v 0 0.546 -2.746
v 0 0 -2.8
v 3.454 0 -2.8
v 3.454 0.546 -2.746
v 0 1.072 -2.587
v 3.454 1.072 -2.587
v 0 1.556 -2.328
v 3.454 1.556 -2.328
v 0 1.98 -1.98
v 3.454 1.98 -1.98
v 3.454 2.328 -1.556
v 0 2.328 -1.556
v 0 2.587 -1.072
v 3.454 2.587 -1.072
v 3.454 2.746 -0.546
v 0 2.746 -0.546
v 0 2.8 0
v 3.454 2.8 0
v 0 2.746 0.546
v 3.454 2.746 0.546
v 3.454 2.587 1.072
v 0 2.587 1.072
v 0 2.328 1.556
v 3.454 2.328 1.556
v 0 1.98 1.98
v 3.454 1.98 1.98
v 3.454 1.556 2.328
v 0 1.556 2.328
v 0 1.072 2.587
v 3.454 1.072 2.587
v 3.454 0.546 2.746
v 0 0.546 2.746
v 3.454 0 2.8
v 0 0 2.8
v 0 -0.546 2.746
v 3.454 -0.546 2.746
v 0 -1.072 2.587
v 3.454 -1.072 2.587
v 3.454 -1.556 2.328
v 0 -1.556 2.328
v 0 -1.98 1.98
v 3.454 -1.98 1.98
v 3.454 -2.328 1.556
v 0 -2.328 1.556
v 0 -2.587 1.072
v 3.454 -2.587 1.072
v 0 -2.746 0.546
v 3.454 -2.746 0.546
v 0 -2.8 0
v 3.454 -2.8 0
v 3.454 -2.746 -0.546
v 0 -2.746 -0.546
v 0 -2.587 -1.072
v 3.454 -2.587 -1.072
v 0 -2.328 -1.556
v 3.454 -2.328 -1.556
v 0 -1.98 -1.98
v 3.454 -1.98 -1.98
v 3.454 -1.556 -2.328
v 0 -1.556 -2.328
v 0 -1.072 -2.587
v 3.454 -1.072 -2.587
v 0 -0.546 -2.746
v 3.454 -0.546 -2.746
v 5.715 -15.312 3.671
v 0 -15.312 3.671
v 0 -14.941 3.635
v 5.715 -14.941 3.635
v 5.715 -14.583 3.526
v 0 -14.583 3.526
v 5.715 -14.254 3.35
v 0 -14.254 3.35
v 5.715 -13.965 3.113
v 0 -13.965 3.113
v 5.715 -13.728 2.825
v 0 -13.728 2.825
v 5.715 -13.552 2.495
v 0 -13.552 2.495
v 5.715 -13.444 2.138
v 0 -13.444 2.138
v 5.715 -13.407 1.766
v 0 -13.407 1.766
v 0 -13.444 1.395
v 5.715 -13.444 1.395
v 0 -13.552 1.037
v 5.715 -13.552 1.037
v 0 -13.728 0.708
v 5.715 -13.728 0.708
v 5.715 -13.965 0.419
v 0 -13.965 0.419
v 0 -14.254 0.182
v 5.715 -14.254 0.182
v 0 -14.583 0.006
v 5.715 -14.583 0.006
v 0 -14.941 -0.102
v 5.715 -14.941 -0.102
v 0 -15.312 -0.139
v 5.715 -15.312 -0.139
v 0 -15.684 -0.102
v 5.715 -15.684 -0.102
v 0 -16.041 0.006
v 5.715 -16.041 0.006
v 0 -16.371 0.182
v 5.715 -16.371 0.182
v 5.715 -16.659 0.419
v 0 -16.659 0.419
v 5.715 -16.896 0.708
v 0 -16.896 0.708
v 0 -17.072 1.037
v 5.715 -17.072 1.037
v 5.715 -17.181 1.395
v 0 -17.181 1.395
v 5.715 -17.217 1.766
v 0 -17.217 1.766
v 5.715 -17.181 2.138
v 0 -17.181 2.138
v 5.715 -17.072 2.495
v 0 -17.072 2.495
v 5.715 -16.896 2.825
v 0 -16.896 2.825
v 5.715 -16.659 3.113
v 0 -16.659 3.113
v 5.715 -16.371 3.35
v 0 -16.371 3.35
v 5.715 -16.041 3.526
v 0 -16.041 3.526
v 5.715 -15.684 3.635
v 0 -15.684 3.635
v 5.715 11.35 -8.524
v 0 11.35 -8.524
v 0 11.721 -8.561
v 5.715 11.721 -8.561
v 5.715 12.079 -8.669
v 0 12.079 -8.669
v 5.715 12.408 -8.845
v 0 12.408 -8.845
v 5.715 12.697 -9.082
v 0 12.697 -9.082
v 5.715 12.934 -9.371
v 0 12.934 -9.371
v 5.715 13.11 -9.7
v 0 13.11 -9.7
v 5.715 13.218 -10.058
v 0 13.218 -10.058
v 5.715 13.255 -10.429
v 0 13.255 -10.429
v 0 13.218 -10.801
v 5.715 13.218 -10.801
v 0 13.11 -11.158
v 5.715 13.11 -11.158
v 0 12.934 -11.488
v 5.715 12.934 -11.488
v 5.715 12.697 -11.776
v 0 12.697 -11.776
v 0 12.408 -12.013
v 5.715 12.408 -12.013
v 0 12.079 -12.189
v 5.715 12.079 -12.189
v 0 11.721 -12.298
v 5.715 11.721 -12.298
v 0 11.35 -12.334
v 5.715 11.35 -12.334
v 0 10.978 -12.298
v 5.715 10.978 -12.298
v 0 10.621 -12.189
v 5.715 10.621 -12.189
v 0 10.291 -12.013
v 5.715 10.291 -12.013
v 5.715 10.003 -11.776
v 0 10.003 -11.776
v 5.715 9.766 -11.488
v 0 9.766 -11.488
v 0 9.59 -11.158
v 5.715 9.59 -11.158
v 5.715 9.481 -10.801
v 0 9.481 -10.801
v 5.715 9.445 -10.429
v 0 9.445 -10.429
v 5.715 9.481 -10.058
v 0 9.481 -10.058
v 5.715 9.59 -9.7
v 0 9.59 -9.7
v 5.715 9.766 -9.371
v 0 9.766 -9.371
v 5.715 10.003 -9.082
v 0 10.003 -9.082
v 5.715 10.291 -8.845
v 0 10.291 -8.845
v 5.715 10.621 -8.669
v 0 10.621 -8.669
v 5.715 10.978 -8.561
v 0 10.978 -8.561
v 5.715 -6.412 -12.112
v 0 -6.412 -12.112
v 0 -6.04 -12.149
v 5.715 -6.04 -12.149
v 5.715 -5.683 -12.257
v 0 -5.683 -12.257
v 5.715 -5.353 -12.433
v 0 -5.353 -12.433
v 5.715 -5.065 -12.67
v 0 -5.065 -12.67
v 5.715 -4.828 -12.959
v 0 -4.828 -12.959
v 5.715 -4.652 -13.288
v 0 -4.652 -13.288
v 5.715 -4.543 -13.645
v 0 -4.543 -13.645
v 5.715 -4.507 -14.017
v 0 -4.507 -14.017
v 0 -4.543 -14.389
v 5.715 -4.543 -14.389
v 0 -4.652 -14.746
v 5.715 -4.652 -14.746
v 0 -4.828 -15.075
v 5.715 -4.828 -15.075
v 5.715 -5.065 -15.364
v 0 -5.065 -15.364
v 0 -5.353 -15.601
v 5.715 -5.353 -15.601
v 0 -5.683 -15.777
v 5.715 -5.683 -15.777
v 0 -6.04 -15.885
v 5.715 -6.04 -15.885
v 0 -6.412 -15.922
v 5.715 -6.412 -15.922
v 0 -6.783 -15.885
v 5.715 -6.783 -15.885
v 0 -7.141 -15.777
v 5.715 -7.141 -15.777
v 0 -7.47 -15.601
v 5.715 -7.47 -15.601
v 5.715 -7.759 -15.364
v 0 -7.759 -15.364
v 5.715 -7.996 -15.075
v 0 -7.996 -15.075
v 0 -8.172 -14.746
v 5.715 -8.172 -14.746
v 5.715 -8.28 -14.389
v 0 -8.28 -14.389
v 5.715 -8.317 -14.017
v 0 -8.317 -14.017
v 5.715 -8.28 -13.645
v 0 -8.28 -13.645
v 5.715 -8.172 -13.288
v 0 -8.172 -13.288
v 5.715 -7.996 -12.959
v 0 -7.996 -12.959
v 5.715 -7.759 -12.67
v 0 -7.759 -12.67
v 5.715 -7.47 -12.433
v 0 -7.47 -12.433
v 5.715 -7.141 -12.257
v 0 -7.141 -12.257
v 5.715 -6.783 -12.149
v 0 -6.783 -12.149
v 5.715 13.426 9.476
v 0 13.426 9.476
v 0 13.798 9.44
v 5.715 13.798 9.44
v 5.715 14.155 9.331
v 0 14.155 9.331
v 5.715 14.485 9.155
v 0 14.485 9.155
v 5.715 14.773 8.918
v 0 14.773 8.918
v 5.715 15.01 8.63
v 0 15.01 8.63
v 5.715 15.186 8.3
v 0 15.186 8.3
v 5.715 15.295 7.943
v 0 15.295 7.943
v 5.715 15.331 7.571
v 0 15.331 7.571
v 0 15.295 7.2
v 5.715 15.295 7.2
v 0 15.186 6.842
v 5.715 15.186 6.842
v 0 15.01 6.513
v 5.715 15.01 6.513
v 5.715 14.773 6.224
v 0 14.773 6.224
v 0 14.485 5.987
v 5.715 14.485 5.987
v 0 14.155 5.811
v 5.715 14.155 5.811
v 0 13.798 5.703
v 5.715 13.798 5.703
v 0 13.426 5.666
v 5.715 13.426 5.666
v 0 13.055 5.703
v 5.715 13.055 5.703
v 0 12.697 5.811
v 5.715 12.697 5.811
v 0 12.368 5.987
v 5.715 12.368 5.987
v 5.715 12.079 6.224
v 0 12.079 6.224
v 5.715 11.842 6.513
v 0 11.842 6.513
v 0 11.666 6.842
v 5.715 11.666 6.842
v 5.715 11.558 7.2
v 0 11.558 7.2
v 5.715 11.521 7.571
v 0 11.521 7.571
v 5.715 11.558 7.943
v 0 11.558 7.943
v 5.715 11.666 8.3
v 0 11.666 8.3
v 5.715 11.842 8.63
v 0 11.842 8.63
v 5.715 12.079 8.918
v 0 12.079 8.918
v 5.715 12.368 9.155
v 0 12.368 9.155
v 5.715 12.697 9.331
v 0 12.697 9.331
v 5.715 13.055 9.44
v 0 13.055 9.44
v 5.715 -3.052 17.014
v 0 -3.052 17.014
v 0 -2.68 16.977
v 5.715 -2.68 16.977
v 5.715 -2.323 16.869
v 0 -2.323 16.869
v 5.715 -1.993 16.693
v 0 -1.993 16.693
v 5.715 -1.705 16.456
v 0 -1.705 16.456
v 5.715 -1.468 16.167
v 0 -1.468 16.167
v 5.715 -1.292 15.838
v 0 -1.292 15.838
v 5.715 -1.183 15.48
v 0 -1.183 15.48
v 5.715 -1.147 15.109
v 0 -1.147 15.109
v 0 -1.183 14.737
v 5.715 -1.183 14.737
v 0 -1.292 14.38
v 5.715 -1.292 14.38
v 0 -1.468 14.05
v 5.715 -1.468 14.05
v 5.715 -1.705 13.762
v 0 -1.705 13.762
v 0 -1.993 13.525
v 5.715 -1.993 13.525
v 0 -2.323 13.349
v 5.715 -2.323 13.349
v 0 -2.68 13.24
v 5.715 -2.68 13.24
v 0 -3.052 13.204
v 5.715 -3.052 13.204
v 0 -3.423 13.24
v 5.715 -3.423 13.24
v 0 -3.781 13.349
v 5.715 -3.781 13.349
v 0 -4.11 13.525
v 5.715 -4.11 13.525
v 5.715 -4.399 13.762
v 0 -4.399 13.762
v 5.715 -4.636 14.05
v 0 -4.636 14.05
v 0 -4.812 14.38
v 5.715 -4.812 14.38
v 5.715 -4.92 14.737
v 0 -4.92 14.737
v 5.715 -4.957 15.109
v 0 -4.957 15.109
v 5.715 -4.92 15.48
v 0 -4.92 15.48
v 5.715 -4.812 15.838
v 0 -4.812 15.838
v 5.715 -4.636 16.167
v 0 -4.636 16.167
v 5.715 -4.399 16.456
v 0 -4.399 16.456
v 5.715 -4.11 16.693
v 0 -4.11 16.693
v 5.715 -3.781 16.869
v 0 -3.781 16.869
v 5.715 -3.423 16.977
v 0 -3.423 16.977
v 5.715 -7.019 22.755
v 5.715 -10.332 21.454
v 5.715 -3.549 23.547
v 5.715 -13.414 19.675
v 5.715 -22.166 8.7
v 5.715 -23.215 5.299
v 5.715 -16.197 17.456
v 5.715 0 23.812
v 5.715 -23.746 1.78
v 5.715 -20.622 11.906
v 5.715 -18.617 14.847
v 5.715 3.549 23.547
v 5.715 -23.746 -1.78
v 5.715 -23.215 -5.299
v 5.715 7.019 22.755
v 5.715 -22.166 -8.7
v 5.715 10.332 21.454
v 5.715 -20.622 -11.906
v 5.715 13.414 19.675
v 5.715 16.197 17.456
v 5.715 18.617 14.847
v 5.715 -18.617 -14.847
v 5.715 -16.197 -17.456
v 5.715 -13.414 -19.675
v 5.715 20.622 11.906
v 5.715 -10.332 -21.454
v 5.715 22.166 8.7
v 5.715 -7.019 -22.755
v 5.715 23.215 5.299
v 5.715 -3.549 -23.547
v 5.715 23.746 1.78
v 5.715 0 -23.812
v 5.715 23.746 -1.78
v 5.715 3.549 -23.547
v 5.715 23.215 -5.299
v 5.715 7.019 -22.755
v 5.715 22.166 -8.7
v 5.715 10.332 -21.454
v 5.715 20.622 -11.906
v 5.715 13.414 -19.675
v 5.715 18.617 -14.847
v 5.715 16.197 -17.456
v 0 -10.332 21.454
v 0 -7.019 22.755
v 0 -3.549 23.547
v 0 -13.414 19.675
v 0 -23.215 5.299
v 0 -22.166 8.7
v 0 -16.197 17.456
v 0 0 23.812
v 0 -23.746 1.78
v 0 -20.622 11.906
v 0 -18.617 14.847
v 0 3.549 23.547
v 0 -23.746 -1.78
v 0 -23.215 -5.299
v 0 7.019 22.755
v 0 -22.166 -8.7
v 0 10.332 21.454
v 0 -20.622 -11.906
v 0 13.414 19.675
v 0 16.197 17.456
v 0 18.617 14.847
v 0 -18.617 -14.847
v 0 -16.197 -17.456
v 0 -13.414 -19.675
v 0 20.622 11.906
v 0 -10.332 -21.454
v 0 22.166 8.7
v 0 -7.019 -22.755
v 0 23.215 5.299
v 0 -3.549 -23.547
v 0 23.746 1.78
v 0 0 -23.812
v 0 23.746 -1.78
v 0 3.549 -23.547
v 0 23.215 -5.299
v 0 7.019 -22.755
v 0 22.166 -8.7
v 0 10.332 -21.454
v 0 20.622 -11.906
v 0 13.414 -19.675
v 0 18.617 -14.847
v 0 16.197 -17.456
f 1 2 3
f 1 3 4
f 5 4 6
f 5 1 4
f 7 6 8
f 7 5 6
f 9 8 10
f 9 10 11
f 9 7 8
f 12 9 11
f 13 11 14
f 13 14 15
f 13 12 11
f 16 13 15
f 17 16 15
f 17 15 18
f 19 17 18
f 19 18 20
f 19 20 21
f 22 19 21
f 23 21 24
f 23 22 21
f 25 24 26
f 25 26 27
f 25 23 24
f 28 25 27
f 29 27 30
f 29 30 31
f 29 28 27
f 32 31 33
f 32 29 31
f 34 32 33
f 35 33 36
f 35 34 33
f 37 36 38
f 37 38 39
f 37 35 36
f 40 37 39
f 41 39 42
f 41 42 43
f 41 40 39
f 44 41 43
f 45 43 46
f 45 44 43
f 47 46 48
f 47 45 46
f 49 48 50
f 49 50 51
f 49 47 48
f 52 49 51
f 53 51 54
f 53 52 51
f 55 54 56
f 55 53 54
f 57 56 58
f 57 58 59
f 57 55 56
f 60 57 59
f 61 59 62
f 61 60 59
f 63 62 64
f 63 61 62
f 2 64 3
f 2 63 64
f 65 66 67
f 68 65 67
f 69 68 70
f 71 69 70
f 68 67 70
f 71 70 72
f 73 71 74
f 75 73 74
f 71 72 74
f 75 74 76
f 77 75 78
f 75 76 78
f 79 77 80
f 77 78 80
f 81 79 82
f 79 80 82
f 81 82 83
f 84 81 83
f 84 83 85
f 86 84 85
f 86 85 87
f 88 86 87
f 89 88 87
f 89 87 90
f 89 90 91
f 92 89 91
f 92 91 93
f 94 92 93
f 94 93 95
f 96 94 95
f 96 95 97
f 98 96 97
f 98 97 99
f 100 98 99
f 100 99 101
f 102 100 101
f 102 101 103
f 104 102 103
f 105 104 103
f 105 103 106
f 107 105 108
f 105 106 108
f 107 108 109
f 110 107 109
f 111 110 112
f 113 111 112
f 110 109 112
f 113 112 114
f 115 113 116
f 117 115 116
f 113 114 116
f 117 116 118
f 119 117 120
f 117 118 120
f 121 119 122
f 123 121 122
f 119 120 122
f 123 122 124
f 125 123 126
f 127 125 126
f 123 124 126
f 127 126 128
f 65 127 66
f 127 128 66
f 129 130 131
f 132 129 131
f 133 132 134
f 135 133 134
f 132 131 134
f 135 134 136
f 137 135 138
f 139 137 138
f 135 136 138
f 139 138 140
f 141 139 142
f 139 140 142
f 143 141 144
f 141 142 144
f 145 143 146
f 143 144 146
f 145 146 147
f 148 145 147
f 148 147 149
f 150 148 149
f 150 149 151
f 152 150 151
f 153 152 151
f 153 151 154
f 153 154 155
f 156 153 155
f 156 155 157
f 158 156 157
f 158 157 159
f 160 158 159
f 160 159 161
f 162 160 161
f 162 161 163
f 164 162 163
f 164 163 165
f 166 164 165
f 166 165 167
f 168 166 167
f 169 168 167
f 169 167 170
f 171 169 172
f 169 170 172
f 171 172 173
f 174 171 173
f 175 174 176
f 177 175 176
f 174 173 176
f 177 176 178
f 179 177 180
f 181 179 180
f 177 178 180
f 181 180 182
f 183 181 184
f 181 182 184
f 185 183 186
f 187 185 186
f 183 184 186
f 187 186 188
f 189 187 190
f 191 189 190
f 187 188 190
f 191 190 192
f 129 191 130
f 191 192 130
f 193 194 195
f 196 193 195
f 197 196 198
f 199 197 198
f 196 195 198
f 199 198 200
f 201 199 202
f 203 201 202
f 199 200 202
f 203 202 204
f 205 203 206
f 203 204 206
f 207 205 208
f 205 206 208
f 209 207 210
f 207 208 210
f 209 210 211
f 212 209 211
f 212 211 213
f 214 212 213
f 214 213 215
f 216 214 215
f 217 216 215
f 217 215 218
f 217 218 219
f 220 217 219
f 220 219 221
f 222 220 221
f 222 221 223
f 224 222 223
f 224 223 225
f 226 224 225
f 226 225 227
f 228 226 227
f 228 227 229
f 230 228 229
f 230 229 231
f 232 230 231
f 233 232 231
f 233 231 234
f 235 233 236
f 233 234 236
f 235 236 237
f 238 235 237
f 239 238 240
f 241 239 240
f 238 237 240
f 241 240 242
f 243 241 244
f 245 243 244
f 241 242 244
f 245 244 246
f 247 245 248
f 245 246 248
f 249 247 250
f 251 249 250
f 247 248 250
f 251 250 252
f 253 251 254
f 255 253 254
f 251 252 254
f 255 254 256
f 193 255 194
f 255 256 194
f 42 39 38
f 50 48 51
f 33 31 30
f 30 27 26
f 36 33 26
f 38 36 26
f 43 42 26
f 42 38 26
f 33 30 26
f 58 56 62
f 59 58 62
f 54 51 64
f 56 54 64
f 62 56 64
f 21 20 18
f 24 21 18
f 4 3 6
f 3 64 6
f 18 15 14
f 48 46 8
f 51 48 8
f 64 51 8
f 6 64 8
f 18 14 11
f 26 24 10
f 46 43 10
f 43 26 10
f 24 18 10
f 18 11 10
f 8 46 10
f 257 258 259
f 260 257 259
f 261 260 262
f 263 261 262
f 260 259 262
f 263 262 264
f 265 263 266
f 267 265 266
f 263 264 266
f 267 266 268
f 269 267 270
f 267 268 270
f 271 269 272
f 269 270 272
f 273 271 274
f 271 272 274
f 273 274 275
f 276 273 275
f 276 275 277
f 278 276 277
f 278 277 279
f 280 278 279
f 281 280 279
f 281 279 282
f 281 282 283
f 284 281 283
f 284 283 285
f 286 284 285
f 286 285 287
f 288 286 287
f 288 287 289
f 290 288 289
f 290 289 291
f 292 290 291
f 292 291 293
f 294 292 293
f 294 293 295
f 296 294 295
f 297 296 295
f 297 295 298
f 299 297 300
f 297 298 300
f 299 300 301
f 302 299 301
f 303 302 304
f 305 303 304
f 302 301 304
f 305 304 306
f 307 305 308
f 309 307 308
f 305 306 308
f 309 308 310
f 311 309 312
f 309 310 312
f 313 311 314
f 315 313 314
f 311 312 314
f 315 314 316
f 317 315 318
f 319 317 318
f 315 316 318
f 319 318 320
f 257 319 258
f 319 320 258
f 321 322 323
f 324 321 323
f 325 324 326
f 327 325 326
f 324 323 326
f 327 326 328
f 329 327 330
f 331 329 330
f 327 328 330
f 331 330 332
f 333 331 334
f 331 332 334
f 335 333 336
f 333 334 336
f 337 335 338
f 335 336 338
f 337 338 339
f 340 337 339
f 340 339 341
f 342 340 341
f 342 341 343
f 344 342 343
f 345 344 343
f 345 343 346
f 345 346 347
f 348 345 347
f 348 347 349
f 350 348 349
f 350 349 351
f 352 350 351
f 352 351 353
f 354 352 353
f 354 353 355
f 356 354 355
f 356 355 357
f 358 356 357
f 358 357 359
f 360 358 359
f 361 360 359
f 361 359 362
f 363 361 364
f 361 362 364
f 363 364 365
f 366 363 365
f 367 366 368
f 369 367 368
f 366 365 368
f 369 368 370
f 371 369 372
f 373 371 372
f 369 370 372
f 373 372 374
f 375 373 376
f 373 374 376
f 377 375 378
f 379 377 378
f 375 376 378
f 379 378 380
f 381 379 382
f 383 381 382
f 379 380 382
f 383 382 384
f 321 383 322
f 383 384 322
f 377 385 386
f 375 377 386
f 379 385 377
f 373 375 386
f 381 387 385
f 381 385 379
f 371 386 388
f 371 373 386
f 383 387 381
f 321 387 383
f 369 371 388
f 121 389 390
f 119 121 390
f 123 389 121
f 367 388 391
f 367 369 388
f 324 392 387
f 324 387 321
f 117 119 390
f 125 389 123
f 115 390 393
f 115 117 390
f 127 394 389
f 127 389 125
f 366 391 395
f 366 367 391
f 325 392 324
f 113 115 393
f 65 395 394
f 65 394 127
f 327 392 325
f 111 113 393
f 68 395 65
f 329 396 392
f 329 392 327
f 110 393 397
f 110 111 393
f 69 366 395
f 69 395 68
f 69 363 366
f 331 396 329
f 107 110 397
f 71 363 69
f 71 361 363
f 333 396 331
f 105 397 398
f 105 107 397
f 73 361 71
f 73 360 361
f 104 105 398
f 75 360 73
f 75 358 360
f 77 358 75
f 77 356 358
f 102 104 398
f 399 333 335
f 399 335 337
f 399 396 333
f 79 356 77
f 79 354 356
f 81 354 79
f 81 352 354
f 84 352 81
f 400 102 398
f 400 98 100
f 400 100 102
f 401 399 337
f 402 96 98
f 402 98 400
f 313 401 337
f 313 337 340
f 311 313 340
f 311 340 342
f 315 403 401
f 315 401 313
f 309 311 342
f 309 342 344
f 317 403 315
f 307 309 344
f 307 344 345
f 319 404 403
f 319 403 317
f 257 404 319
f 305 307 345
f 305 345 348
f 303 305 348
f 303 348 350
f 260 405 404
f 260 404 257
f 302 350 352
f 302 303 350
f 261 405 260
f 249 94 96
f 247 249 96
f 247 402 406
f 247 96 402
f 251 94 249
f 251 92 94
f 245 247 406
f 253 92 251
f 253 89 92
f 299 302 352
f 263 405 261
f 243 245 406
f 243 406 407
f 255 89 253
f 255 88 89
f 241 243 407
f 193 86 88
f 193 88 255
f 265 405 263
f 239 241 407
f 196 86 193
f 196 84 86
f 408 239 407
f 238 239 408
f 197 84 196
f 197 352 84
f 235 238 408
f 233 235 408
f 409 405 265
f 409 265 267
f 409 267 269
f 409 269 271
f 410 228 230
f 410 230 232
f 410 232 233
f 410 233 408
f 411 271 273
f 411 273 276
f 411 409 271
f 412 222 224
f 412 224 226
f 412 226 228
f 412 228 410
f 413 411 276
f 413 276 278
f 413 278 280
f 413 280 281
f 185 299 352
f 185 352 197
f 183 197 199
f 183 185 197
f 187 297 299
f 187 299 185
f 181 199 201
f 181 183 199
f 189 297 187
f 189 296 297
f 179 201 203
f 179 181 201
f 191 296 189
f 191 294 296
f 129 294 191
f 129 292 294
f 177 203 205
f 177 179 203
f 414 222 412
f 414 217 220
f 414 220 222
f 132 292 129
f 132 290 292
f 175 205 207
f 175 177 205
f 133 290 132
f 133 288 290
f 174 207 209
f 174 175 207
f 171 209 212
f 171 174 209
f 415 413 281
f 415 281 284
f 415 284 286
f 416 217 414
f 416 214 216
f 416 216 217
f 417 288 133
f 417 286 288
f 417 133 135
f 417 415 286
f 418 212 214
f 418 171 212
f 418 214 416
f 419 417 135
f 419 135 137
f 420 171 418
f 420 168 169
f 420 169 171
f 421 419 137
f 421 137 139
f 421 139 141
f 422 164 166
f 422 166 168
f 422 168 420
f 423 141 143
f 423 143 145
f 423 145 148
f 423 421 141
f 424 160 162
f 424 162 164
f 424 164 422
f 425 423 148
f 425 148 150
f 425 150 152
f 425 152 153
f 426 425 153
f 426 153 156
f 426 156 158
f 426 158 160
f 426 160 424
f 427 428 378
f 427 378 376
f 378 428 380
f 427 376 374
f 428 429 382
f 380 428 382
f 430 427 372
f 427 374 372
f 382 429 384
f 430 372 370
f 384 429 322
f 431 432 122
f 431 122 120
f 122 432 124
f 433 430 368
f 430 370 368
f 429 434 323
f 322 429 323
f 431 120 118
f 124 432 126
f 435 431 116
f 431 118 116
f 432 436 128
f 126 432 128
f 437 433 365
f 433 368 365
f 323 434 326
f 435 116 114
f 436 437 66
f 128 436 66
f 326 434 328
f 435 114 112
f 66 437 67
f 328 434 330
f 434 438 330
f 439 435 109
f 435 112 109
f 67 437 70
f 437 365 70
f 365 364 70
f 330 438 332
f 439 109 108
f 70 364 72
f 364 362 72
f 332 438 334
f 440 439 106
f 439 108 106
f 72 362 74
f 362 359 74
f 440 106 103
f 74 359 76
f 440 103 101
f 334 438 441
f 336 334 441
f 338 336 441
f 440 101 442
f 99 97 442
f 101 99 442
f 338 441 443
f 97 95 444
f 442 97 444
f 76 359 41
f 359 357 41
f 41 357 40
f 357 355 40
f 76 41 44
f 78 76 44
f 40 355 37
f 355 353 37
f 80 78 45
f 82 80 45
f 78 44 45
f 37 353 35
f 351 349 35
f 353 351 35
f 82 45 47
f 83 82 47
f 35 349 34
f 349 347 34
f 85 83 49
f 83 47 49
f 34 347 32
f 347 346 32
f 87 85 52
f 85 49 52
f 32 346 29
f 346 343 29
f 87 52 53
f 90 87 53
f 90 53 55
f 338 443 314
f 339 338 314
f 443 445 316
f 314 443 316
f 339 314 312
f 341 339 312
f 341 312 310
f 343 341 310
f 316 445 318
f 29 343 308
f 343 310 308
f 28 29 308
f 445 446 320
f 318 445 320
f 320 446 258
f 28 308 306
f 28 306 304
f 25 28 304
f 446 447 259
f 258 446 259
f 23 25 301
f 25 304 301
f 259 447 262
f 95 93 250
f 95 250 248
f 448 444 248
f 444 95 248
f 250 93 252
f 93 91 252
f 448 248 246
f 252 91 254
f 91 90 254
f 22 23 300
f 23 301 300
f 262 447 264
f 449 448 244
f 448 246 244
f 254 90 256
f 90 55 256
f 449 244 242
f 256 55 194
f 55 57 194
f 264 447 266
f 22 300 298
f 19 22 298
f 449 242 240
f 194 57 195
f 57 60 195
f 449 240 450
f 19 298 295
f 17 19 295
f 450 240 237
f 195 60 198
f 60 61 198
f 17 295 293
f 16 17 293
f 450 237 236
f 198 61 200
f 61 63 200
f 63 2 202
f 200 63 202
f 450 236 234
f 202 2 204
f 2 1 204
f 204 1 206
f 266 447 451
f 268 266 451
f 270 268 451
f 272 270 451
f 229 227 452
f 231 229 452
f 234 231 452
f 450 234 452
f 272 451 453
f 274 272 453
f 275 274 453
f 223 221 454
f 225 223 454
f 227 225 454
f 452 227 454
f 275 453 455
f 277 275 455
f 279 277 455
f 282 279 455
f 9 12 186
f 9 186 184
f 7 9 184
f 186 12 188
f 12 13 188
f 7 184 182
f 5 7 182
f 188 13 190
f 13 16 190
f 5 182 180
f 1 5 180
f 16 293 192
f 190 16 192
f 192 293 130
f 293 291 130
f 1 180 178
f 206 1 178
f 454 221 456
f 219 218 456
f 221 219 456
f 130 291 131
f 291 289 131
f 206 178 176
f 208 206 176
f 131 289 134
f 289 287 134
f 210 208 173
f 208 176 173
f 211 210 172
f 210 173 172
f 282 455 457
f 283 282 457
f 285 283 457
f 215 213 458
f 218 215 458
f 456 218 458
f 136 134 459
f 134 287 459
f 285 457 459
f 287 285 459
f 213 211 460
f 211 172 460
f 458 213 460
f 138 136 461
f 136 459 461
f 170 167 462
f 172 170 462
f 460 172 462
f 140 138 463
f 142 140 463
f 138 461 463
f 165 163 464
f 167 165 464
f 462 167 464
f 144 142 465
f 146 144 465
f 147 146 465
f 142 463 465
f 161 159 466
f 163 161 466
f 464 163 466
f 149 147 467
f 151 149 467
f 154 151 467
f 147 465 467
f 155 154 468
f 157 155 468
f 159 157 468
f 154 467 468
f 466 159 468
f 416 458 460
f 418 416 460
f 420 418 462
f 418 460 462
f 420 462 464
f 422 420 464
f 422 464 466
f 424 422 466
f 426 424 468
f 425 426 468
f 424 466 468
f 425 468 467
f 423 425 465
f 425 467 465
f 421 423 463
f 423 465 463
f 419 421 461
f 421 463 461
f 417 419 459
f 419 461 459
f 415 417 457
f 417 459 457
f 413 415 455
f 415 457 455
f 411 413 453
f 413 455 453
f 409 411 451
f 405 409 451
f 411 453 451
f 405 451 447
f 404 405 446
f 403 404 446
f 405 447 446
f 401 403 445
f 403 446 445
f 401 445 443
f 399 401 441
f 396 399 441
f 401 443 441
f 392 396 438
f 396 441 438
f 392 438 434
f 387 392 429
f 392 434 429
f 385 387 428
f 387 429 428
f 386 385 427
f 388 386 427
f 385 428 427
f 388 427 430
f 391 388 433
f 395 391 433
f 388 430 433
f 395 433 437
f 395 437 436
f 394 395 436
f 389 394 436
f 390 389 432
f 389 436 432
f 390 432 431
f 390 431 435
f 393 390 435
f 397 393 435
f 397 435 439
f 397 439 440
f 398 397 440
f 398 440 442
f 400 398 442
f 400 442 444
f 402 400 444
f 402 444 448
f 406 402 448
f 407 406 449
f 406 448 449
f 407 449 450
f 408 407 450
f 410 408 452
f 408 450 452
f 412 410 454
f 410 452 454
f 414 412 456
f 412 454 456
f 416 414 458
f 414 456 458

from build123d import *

# Parameters (mm, degrees)
SKETCH1_R          = 23.8125
WHEEL_BODY_DEPTH   = 5.715
SKETCH2_R          = 2.8
C24T_SPLINE_DEPTH  = 3.4544
SKETCH3_R          = 1.905
CUT_EXTRUDE2_DEPTH = 35.157452152


with BuildPart() as part:
    # Sketch1 → Wheel Body (new body)
    with BuildSketch(Plane(origin=(0, 0, 0), x_dir=(0, 0, -1), z_dir=(1, 0, 0))):
        Circle(SKETCH1_R)
    extrude(amount=WHEEL_BODY_DEPTH)

    # Sketch2 → C24T Spline (cut)
    with BuildSketch(Plane(origin=(0, 0, 0), x_dir=(0, 0, -1), z_dir=(1, 0, 0))):
        Circle(SKETCH2_R)
    extrude(amount=C24T_SPLINE_DEPTH, mode=Mode.SUBTRACT)

    # Sketch3 → Cut-Extrude2 (cut, through all)
    with BuildSketch(Plane.ZY):
        with Locations((-10.429406727, 11.349688472)):
            Circle(SKETCH3_R)
        with Locations((7.571331259, 13.426201847)):
            Circle(SKETCH3_R)
        with Locations((15.108746785, -3.05183939)):
            Circle(SKETCH3_R)
        with Locations((1.766387782, -15.312342319)):
            Circle(SKETCH3_R)
        with Locations((-14.017059099, -6.41170861)):
            Circle(SKETCH3_R)
    extrude(amount=-CUT_EXTRUDE2_DEPTH, mode=Mode.SUBTRACT)


solid = part.part
